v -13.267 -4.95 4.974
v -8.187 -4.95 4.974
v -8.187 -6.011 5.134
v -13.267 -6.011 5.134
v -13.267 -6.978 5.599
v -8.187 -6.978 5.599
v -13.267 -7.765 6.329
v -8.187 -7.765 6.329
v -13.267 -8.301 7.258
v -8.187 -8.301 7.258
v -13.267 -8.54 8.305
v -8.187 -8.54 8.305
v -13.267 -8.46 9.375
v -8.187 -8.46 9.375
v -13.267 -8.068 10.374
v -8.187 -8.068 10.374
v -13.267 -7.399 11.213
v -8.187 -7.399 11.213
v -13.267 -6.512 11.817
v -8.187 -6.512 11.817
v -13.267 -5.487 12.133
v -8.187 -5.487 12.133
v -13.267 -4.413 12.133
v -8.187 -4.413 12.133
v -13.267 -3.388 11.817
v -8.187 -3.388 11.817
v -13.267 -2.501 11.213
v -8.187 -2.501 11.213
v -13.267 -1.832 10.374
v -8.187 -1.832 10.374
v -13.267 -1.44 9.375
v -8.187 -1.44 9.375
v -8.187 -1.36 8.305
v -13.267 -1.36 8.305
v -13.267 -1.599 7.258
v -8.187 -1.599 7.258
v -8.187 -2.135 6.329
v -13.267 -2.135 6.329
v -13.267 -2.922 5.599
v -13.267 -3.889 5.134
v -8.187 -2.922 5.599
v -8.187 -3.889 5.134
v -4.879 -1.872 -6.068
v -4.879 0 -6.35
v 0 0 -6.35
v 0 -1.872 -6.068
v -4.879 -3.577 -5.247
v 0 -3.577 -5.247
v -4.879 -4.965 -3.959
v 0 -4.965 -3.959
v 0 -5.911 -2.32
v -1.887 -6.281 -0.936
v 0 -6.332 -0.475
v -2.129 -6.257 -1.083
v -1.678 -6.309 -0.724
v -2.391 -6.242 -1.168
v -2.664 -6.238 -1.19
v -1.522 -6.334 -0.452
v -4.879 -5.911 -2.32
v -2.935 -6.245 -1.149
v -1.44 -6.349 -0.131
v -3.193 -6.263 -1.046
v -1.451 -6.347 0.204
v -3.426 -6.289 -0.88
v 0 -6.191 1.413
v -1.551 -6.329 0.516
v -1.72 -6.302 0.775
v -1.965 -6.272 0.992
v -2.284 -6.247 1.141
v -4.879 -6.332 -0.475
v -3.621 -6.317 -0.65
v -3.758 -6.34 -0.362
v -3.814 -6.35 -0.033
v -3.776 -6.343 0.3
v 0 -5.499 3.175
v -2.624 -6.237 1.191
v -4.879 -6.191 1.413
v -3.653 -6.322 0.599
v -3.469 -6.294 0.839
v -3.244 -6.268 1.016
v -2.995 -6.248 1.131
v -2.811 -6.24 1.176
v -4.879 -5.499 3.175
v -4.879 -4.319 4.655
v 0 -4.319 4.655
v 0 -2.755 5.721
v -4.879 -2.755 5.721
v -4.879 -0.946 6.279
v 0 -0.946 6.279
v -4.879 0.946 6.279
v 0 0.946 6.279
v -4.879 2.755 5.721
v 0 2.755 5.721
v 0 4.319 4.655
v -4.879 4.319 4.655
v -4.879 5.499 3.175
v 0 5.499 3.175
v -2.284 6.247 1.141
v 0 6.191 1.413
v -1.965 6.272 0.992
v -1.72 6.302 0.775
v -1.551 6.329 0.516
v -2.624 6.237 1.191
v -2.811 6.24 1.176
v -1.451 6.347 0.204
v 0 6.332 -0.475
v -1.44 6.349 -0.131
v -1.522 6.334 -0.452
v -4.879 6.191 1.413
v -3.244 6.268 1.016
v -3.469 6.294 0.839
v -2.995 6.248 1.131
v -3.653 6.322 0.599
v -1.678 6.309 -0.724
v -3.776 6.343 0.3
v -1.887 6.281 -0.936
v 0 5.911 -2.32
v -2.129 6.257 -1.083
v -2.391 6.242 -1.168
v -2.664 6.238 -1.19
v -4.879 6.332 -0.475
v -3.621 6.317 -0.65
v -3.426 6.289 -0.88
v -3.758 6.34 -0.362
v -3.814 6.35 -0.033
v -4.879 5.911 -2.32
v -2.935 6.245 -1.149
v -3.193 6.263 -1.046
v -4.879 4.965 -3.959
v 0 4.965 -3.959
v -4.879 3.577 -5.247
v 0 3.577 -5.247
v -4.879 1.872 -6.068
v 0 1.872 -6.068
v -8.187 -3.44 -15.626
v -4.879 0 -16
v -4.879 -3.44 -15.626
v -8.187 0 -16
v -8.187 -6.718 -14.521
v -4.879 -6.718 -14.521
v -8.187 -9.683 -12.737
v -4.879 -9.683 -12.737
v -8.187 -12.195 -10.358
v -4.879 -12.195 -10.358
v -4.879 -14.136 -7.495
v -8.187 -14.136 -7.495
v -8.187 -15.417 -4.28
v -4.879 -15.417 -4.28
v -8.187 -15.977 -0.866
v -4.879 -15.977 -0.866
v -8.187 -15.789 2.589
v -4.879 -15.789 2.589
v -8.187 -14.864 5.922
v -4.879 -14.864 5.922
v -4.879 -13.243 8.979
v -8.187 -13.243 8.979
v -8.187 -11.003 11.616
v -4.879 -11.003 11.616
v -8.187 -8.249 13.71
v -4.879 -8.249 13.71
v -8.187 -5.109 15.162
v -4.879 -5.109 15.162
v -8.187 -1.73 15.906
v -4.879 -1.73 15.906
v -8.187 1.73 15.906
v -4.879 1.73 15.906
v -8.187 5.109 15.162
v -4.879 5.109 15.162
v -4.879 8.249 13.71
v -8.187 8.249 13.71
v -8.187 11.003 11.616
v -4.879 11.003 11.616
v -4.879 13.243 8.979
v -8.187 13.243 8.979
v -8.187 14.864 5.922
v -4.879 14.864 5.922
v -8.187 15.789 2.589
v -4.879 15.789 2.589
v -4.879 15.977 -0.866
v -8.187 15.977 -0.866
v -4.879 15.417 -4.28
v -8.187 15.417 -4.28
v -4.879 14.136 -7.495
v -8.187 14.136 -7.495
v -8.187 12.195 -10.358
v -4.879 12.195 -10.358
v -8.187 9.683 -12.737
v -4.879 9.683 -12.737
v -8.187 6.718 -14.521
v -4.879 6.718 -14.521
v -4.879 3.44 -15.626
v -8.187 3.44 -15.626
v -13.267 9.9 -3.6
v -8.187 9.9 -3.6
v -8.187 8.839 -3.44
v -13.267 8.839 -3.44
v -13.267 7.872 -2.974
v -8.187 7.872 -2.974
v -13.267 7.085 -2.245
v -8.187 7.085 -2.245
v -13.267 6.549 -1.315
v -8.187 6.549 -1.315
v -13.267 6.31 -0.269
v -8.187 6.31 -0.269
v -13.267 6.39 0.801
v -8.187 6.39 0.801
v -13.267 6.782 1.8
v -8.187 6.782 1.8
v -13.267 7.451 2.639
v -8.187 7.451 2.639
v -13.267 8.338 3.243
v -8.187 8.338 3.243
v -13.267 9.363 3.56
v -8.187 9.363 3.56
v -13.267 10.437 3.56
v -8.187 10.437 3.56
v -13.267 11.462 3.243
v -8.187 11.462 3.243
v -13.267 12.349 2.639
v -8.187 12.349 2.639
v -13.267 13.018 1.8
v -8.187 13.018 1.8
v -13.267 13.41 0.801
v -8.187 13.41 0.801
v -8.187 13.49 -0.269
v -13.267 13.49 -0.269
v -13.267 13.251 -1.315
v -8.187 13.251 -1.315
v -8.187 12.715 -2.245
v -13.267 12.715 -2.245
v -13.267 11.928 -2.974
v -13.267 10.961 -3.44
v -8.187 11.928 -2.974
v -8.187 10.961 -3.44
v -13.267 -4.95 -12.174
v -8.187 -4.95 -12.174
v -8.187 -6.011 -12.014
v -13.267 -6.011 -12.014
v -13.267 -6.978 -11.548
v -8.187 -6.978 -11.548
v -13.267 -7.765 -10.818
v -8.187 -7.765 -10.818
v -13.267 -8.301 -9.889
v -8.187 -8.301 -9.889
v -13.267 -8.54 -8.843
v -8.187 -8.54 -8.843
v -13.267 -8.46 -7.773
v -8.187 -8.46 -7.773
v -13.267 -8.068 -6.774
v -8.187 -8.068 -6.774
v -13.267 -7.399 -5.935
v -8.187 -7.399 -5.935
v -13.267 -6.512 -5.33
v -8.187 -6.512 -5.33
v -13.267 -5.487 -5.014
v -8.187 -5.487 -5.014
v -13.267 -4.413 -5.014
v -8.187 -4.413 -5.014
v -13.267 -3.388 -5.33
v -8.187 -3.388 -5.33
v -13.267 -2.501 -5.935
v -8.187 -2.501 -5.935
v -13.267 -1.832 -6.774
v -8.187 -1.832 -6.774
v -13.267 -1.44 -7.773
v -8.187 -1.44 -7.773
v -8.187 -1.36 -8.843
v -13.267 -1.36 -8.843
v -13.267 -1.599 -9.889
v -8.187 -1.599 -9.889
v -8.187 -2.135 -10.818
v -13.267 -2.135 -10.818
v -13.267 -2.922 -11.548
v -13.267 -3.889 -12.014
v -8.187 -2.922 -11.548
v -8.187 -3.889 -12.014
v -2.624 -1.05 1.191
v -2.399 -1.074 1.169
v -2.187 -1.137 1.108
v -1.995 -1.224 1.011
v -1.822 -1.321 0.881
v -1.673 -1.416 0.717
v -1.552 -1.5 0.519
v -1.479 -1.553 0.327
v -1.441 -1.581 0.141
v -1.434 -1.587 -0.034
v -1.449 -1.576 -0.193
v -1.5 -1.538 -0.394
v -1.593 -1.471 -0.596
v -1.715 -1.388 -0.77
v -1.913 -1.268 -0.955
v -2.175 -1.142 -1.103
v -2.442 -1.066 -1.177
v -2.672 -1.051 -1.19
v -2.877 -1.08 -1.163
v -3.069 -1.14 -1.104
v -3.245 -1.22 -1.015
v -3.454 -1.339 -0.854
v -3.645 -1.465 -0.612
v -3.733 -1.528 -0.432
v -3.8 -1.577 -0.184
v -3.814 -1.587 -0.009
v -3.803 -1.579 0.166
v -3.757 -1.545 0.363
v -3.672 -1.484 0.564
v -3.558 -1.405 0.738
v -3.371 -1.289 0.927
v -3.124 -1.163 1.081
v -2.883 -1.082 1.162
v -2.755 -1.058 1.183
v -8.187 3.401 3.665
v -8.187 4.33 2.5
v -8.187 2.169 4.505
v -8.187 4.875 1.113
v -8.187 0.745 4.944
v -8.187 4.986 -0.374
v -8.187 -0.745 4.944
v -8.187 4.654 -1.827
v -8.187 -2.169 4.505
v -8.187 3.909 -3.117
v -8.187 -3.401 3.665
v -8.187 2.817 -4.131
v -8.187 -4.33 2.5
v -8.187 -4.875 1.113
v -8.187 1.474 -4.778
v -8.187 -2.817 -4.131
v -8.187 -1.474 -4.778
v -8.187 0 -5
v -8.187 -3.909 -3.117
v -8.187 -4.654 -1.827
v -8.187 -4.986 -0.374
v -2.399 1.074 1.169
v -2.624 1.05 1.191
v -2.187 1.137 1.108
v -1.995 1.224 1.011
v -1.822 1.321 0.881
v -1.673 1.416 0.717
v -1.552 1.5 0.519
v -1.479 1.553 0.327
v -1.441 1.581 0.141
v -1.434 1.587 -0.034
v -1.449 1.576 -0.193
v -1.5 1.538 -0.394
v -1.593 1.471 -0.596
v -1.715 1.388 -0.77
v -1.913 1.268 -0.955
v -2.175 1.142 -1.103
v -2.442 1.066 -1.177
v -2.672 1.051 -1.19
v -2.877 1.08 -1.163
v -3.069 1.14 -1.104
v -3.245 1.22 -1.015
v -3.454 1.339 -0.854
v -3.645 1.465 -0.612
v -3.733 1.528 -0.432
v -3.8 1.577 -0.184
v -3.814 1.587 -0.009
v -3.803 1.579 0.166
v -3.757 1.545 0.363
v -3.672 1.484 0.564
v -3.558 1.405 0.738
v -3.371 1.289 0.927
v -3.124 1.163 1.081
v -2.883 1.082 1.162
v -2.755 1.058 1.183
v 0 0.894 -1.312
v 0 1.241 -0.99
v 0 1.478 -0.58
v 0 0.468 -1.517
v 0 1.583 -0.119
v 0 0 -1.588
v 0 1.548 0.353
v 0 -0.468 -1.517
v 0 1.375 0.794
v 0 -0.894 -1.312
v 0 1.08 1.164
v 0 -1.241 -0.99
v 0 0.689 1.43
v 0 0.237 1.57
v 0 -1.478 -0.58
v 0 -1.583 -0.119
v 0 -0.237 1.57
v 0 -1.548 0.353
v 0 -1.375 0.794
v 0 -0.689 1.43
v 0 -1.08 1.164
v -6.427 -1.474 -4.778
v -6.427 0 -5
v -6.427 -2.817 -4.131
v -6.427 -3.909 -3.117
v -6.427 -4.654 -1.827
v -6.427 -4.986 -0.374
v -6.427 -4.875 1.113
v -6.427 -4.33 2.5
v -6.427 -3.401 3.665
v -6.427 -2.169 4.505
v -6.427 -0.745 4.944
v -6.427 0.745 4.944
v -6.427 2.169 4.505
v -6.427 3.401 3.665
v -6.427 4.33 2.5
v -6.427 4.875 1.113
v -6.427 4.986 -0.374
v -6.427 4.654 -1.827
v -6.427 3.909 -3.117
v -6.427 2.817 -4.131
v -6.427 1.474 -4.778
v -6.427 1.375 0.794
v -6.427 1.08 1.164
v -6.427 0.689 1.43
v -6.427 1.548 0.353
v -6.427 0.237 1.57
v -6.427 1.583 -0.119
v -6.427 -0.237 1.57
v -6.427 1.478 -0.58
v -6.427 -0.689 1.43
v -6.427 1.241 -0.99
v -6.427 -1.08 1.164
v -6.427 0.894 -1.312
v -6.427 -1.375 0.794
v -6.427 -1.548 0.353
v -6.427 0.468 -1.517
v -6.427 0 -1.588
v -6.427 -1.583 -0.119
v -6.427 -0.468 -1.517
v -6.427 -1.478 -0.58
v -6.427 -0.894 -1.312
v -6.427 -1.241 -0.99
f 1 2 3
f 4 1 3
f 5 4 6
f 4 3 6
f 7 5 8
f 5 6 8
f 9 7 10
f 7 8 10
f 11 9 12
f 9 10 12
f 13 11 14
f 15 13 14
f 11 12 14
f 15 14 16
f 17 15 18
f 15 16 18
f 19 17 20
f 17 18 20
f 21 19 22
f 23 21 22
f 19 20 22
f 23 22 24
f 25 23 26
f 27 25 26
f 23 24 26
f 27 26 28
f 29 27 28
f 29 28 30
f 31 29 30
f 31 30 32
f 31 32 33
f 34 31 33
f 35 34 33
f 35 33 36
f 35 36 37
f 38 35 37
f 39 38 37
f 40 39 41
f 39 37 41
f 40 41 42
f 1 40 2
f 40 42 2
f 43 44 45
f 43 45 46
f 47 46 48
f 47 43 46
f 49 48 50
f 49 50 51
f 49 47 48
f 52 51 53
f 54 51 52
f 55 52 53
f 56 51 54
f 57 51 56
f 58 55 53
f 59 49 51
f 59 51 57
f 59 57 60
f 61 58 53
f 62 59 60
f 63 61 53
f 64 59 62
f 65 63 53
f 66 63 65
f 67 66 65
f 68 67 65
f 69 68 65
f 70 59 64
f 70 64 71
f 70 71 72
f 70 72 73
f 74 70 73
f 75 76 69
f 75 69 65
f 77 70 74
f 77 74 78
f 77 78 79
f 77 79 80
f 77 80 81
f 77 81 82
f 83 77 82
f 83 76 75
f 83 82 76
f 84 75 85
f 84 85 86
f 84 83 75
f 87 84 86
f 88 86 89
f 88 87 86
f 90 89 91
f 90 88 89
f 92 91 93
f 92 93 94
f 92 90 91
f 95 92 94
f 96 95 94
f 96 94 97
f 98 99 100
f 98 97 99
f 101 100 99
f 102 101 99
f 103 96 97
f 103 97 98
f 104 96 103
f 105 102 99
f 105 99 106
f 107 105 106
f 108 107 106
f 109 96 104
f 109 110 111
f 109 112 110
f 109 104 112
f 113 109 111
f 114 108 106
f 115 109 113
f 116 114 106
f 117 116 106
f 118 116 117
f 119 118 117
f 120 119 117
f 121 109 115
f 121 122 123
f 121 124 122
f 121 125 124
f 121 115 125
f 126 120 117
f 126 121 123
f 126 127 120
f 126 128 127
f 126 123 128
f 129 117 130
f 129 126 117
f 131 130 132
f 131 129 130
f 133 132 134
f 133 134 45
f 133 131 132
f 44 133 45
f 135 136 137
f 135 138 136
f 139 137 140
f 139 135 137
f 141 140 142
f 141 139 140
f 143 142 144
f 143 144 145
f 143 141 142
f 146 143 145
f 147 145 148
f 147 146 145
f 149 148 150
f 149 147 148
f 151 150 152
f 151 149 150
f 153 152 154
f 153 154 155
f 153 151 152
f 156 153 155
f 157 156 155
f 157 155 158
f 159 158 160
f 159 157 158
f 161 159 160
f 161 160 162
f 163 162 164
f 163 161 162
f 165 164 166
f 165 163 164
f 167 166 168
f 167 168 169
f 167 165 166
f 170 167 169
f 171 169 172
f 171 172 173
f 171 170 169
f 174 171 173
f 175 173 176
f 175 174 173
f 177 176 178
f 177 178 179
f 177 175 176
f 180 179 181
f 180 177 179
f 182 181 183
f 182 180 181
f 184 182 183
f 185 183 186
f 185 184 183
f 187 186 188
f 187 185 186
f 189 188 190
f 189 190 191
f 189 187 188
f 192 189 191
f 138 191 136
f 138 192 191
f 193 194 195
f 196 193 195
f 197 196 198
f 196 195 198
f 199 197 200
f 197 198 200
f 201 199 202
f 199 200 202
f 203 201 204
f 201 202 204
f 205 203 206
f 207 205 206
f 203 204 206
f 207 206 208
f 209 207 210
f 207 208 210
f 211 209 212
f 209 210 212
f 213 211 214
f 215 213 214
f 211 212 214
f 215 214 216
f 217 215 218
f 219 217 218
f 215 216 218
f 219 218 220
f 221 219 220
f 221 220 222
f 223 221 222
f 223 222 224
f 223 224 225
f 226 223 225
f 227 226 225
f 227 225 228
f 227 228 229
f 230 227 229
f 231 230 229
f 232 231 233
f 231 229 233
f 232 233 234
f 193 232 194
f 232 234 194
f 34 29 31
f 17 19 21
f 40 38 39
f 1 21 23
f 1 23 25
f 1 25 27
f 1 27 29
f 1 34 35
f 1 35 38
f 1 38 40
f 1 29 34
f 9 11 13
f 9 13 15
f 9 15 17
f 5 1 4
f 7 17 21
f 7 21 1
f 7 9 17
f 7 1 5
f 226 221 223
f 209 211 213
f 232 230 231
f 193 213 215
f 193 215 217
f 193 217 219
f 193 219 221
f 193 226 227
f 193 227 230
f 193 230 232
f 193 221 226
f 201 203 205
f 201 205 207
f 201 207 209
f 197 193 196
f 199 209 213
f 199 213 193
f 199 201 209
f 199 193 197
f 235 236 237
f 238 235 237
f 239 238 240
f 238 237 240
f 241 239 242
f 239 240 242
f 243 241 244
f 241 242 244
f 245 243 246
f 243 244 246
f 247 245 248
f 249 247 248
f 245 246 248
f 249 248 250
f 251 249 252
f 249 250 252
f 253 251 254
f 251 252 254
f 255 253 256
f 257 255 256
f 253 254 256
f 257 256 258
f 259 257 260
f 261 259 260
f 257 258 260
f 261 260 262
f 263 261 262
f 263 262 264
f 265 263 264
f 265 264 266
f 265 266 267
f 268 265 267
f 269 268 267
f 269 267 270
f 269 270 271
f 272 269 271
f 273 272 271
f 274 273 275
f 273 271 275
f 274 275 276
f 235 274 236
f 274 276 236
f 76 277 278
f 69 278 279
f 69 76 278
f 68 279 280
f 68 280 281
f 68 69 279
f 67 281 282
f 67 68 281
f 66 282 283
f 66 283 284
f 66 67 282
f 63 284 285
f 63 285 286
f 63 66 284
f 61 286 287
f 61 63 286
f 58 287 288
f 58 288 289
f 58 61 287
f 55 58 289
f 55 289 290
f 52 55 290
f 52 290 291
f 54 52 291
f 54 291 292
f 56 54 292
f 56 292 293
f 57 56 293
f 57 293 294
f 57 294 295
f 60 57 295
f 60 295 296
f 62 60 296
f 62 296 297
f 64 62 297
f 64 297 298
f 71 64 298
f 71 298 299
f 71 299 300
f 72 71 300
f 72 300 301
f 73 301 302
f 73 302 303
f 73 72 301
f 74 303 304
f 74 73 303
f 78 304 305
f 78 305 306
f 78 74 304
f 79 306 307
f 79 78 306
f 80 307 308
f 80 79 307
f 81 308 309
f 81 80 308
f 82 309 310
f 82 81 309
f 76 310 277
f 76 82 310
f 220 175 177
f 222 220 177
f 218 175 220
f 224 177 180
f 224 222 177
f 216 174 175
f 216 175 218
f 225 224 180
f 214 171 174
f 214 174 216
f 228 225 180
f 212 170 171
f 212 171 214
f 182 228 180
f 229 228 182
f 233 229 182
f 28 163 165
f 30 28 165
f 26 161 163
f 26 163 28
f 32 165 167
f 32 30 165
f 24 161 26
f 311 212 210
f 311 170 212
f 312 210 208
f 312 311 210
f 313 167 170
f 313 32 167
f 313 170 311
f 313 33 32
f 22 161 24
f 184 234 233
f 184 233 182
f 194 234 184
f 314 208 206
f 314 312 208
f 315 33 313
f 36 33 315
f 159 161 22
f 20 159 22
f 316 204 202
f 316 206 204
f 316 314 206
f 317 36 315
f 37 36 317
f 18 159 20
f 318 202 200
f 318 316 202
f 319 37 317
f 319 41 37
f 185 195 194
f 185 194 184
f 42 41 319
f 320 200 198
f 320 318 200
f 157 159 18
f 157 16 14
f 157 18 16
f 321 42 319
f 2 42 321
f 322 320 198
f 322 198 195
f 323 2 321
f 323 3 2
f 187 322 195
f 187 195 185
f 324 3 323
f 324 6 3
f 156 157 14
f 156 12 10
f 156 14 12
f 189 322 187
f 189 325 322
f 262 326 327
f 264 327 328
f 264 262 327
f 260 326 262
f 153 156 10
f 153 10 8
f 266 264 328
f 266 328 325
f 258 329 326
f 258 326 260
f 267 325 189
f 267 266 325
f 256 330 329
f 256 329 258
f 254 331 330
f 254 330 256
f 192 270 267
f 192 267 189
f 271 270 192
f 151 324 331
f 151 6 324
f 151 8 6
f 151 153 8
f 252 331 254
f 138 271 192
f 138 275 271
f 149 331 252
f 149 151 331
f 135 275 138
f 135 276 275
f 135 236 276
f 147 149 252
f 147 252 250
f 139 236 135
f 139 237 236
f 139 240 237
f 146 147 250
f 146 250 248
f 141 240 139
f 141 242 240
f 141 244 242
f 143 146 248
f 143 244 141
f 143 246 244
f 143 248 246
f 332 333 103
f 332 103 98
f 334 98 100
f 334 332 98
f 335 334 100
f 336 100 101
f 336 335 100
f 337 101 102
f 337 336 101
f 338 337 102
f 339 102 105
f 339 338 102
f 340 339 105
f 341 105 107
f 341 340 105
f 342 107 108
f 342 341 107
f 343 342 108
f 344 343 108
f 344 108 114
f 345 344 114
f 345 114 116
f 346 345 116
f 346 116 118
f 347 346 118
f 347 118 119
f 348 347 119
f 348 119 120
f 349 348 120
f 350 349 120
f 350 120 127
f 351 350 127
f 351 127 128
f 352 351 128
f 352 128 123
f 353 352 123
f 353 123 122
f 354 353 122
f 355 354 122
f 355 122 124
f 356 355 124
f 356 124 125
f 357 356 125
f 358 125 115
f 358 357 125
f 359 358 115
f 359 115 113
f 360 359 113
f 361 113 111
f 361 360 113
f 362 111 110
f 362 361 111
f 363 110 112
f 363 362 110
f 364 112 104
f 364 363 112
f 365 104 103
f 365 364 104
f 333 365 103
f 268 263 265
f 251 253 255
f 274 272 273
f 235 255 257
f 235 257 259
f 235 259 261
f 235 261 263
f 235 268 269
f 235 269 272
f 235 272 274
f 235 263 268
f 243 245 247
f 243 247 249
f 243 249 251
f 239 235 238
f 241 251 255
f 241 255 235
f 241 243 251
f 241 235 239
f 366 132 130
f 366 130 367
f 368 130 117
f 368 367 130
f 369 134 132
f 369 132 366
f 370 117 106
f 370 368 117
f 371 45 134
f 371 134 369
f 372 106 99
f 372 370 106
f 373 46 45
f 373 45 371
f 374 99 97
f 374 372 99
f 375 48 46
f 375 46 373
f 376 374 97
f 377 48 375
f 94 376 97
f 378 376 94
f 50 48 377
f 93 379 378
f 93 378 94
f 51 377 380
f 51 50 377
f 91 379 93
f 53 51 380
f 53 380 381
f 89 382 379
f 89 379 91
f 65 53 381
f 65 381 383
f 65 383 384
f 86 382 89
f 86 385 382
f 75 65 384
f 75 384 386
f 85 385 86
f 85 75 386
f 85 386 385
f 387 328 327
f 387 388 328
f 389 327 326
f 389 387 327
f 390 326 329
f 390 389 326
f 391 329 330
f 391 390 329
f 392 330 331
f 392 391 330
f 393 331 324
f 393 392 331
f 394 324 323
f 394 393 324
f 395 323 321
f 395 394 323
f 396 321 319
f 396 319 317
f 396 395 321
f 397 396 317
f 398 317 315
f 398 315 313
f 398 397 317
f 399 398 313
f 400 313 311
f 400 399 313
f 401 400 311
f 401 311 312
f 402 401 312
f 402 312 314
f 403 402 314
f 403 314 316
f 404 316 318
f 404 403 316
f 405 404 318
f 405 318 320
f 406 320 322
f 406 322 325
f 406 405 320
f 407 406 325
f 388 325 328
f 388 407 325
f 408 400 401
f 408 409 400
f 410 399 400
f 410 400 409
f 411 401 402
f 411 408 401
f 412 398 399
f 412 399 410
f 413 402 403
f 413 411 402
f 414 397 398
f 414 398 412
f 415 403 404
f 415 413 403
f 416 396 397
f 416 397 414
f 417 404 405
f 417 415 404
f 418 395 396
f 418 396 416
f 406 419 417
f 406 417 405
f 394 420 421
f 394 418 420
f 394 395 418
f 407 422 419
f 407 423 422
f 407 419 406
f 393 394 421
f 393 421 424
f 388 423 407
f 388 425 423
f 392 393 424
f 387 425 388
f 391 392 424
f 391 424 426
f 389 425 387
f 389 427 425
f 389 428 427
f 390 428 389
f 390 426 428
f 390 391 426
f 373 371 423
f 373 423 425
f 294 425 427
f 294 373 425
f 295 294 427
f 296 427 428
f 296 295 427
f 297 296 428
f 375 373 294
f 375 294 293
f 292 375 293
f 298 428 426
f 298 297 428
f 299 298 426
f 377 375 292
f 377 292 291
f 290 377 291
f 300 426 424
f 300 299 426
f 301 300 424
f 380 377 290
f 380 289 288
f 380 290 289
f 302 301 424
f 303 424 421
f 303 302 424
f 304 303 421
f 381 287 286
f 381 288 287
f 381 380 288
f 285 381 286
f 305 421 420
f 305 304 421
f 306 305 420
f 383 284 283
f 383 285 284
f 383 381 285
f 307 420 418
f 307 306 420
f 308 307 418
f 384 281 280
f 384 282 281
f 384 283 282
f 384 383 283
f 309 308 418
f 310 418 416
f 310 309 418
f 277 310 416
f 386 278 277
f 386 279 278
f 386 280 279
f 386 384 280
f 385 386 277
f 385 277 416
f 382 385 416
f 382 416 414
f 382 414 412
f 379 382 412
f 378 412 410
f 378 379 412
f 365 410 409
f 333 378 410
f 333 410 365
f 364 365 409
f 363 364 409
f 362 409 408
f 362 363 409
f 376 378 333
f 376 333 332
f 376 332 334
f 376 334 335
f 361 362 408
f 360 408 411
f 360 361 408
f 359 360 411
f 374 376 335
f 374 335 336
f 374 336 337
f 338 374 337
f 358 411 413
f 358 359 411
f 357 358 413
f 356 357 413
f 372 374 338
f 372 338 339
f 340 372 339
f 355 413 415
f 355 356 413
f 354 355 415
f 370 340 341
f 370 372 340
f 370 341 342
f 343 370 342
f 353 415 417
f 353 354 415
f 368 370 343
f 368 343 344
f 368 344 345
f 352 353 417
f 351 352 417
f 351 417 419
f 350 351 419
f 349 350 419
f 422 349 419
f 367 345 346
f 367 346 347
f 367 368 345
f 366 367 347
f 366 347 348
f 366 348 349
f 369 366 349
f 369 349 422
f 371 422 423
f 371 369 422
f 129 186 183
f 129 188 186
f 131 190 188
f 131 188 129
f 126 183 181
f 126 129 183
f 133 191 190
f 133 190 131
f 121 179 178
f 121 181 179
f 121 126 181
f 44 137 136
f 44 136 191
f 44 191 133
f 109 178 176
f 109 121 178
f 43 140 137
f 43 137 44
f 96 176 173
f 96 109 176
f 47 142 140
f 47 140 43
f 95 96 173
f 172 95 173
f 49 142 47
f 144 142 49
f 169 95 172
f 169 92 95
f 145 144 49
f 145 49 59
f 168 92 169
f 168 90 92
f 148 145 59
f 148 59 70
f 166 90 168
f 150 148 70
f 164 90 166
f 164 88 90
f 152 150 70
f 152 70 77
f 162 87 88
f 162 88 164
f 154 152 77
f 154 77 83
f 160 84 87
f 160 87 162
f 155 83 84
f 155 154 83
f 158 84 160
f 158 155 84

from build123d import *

# Parameters (mm, degrees)
SKETCH2_R               = 3.6
BOSS_EXTRUDE1_DEPTH     = 5.08
CUT_EXTRUDE1_DEPTH      = 27.23020328
CUT_EXTRUDE1_DEPTH_BACK = 27.23020328
SKETCH3_R               = 1.190625


with BuildPart() as part:
    # Sketch1 → Revolve1 (revolve)
    with BuildSketch(Plane.XY):
        Polygon((0, 1.5875), (0, 6.35), (-4.87911158, 6.35), (-4.87911158, 16), (-8.187387237, 16), (-8.187387237, 5), (-6.426815736, 5), (-6.426815736, 1.5875), align=None)
    revolve(axis=Axis((0, 0, 0), (-1, 0, 0)))

    # Sketch2 → Boss-Extrude1 (add)
    with BuildSketch(Plane.ZY.offset(8.187387237)):
        with Locations((0, 9.9)):
            Circle(SKETCH2_R)
        with Locations((8.573651497, -4.95)):
            Circle(SKETCH2_R)
        with Locations((-8.573651497, -4.95)):
            Circle(SKETCH2_R)
    extrude(amount=BOSS_EXTRUDE1_DEPTH)

    # Sketch3 → Cut-Extrude1 (cut, two sides: drawn at the far end of the back side and taken through both)
    with BuildSketch(Plane(origin=(0, 0, 0), x_dir=(1, 0, 0), z_dir=(0, 1, 0)).offset(-CUT_EXTRUDE1_DEPTH_BACK)):
        with Locations((-2.623694819, 0)):
            Circle(SKETCH3_R)
    extrude(amount=CUT_EXTRUDE1_DEPTH + CUT_EXTRUDE1_DEPTH_BACK, mode=Mode.SUBTRACT)


solid = part.part
